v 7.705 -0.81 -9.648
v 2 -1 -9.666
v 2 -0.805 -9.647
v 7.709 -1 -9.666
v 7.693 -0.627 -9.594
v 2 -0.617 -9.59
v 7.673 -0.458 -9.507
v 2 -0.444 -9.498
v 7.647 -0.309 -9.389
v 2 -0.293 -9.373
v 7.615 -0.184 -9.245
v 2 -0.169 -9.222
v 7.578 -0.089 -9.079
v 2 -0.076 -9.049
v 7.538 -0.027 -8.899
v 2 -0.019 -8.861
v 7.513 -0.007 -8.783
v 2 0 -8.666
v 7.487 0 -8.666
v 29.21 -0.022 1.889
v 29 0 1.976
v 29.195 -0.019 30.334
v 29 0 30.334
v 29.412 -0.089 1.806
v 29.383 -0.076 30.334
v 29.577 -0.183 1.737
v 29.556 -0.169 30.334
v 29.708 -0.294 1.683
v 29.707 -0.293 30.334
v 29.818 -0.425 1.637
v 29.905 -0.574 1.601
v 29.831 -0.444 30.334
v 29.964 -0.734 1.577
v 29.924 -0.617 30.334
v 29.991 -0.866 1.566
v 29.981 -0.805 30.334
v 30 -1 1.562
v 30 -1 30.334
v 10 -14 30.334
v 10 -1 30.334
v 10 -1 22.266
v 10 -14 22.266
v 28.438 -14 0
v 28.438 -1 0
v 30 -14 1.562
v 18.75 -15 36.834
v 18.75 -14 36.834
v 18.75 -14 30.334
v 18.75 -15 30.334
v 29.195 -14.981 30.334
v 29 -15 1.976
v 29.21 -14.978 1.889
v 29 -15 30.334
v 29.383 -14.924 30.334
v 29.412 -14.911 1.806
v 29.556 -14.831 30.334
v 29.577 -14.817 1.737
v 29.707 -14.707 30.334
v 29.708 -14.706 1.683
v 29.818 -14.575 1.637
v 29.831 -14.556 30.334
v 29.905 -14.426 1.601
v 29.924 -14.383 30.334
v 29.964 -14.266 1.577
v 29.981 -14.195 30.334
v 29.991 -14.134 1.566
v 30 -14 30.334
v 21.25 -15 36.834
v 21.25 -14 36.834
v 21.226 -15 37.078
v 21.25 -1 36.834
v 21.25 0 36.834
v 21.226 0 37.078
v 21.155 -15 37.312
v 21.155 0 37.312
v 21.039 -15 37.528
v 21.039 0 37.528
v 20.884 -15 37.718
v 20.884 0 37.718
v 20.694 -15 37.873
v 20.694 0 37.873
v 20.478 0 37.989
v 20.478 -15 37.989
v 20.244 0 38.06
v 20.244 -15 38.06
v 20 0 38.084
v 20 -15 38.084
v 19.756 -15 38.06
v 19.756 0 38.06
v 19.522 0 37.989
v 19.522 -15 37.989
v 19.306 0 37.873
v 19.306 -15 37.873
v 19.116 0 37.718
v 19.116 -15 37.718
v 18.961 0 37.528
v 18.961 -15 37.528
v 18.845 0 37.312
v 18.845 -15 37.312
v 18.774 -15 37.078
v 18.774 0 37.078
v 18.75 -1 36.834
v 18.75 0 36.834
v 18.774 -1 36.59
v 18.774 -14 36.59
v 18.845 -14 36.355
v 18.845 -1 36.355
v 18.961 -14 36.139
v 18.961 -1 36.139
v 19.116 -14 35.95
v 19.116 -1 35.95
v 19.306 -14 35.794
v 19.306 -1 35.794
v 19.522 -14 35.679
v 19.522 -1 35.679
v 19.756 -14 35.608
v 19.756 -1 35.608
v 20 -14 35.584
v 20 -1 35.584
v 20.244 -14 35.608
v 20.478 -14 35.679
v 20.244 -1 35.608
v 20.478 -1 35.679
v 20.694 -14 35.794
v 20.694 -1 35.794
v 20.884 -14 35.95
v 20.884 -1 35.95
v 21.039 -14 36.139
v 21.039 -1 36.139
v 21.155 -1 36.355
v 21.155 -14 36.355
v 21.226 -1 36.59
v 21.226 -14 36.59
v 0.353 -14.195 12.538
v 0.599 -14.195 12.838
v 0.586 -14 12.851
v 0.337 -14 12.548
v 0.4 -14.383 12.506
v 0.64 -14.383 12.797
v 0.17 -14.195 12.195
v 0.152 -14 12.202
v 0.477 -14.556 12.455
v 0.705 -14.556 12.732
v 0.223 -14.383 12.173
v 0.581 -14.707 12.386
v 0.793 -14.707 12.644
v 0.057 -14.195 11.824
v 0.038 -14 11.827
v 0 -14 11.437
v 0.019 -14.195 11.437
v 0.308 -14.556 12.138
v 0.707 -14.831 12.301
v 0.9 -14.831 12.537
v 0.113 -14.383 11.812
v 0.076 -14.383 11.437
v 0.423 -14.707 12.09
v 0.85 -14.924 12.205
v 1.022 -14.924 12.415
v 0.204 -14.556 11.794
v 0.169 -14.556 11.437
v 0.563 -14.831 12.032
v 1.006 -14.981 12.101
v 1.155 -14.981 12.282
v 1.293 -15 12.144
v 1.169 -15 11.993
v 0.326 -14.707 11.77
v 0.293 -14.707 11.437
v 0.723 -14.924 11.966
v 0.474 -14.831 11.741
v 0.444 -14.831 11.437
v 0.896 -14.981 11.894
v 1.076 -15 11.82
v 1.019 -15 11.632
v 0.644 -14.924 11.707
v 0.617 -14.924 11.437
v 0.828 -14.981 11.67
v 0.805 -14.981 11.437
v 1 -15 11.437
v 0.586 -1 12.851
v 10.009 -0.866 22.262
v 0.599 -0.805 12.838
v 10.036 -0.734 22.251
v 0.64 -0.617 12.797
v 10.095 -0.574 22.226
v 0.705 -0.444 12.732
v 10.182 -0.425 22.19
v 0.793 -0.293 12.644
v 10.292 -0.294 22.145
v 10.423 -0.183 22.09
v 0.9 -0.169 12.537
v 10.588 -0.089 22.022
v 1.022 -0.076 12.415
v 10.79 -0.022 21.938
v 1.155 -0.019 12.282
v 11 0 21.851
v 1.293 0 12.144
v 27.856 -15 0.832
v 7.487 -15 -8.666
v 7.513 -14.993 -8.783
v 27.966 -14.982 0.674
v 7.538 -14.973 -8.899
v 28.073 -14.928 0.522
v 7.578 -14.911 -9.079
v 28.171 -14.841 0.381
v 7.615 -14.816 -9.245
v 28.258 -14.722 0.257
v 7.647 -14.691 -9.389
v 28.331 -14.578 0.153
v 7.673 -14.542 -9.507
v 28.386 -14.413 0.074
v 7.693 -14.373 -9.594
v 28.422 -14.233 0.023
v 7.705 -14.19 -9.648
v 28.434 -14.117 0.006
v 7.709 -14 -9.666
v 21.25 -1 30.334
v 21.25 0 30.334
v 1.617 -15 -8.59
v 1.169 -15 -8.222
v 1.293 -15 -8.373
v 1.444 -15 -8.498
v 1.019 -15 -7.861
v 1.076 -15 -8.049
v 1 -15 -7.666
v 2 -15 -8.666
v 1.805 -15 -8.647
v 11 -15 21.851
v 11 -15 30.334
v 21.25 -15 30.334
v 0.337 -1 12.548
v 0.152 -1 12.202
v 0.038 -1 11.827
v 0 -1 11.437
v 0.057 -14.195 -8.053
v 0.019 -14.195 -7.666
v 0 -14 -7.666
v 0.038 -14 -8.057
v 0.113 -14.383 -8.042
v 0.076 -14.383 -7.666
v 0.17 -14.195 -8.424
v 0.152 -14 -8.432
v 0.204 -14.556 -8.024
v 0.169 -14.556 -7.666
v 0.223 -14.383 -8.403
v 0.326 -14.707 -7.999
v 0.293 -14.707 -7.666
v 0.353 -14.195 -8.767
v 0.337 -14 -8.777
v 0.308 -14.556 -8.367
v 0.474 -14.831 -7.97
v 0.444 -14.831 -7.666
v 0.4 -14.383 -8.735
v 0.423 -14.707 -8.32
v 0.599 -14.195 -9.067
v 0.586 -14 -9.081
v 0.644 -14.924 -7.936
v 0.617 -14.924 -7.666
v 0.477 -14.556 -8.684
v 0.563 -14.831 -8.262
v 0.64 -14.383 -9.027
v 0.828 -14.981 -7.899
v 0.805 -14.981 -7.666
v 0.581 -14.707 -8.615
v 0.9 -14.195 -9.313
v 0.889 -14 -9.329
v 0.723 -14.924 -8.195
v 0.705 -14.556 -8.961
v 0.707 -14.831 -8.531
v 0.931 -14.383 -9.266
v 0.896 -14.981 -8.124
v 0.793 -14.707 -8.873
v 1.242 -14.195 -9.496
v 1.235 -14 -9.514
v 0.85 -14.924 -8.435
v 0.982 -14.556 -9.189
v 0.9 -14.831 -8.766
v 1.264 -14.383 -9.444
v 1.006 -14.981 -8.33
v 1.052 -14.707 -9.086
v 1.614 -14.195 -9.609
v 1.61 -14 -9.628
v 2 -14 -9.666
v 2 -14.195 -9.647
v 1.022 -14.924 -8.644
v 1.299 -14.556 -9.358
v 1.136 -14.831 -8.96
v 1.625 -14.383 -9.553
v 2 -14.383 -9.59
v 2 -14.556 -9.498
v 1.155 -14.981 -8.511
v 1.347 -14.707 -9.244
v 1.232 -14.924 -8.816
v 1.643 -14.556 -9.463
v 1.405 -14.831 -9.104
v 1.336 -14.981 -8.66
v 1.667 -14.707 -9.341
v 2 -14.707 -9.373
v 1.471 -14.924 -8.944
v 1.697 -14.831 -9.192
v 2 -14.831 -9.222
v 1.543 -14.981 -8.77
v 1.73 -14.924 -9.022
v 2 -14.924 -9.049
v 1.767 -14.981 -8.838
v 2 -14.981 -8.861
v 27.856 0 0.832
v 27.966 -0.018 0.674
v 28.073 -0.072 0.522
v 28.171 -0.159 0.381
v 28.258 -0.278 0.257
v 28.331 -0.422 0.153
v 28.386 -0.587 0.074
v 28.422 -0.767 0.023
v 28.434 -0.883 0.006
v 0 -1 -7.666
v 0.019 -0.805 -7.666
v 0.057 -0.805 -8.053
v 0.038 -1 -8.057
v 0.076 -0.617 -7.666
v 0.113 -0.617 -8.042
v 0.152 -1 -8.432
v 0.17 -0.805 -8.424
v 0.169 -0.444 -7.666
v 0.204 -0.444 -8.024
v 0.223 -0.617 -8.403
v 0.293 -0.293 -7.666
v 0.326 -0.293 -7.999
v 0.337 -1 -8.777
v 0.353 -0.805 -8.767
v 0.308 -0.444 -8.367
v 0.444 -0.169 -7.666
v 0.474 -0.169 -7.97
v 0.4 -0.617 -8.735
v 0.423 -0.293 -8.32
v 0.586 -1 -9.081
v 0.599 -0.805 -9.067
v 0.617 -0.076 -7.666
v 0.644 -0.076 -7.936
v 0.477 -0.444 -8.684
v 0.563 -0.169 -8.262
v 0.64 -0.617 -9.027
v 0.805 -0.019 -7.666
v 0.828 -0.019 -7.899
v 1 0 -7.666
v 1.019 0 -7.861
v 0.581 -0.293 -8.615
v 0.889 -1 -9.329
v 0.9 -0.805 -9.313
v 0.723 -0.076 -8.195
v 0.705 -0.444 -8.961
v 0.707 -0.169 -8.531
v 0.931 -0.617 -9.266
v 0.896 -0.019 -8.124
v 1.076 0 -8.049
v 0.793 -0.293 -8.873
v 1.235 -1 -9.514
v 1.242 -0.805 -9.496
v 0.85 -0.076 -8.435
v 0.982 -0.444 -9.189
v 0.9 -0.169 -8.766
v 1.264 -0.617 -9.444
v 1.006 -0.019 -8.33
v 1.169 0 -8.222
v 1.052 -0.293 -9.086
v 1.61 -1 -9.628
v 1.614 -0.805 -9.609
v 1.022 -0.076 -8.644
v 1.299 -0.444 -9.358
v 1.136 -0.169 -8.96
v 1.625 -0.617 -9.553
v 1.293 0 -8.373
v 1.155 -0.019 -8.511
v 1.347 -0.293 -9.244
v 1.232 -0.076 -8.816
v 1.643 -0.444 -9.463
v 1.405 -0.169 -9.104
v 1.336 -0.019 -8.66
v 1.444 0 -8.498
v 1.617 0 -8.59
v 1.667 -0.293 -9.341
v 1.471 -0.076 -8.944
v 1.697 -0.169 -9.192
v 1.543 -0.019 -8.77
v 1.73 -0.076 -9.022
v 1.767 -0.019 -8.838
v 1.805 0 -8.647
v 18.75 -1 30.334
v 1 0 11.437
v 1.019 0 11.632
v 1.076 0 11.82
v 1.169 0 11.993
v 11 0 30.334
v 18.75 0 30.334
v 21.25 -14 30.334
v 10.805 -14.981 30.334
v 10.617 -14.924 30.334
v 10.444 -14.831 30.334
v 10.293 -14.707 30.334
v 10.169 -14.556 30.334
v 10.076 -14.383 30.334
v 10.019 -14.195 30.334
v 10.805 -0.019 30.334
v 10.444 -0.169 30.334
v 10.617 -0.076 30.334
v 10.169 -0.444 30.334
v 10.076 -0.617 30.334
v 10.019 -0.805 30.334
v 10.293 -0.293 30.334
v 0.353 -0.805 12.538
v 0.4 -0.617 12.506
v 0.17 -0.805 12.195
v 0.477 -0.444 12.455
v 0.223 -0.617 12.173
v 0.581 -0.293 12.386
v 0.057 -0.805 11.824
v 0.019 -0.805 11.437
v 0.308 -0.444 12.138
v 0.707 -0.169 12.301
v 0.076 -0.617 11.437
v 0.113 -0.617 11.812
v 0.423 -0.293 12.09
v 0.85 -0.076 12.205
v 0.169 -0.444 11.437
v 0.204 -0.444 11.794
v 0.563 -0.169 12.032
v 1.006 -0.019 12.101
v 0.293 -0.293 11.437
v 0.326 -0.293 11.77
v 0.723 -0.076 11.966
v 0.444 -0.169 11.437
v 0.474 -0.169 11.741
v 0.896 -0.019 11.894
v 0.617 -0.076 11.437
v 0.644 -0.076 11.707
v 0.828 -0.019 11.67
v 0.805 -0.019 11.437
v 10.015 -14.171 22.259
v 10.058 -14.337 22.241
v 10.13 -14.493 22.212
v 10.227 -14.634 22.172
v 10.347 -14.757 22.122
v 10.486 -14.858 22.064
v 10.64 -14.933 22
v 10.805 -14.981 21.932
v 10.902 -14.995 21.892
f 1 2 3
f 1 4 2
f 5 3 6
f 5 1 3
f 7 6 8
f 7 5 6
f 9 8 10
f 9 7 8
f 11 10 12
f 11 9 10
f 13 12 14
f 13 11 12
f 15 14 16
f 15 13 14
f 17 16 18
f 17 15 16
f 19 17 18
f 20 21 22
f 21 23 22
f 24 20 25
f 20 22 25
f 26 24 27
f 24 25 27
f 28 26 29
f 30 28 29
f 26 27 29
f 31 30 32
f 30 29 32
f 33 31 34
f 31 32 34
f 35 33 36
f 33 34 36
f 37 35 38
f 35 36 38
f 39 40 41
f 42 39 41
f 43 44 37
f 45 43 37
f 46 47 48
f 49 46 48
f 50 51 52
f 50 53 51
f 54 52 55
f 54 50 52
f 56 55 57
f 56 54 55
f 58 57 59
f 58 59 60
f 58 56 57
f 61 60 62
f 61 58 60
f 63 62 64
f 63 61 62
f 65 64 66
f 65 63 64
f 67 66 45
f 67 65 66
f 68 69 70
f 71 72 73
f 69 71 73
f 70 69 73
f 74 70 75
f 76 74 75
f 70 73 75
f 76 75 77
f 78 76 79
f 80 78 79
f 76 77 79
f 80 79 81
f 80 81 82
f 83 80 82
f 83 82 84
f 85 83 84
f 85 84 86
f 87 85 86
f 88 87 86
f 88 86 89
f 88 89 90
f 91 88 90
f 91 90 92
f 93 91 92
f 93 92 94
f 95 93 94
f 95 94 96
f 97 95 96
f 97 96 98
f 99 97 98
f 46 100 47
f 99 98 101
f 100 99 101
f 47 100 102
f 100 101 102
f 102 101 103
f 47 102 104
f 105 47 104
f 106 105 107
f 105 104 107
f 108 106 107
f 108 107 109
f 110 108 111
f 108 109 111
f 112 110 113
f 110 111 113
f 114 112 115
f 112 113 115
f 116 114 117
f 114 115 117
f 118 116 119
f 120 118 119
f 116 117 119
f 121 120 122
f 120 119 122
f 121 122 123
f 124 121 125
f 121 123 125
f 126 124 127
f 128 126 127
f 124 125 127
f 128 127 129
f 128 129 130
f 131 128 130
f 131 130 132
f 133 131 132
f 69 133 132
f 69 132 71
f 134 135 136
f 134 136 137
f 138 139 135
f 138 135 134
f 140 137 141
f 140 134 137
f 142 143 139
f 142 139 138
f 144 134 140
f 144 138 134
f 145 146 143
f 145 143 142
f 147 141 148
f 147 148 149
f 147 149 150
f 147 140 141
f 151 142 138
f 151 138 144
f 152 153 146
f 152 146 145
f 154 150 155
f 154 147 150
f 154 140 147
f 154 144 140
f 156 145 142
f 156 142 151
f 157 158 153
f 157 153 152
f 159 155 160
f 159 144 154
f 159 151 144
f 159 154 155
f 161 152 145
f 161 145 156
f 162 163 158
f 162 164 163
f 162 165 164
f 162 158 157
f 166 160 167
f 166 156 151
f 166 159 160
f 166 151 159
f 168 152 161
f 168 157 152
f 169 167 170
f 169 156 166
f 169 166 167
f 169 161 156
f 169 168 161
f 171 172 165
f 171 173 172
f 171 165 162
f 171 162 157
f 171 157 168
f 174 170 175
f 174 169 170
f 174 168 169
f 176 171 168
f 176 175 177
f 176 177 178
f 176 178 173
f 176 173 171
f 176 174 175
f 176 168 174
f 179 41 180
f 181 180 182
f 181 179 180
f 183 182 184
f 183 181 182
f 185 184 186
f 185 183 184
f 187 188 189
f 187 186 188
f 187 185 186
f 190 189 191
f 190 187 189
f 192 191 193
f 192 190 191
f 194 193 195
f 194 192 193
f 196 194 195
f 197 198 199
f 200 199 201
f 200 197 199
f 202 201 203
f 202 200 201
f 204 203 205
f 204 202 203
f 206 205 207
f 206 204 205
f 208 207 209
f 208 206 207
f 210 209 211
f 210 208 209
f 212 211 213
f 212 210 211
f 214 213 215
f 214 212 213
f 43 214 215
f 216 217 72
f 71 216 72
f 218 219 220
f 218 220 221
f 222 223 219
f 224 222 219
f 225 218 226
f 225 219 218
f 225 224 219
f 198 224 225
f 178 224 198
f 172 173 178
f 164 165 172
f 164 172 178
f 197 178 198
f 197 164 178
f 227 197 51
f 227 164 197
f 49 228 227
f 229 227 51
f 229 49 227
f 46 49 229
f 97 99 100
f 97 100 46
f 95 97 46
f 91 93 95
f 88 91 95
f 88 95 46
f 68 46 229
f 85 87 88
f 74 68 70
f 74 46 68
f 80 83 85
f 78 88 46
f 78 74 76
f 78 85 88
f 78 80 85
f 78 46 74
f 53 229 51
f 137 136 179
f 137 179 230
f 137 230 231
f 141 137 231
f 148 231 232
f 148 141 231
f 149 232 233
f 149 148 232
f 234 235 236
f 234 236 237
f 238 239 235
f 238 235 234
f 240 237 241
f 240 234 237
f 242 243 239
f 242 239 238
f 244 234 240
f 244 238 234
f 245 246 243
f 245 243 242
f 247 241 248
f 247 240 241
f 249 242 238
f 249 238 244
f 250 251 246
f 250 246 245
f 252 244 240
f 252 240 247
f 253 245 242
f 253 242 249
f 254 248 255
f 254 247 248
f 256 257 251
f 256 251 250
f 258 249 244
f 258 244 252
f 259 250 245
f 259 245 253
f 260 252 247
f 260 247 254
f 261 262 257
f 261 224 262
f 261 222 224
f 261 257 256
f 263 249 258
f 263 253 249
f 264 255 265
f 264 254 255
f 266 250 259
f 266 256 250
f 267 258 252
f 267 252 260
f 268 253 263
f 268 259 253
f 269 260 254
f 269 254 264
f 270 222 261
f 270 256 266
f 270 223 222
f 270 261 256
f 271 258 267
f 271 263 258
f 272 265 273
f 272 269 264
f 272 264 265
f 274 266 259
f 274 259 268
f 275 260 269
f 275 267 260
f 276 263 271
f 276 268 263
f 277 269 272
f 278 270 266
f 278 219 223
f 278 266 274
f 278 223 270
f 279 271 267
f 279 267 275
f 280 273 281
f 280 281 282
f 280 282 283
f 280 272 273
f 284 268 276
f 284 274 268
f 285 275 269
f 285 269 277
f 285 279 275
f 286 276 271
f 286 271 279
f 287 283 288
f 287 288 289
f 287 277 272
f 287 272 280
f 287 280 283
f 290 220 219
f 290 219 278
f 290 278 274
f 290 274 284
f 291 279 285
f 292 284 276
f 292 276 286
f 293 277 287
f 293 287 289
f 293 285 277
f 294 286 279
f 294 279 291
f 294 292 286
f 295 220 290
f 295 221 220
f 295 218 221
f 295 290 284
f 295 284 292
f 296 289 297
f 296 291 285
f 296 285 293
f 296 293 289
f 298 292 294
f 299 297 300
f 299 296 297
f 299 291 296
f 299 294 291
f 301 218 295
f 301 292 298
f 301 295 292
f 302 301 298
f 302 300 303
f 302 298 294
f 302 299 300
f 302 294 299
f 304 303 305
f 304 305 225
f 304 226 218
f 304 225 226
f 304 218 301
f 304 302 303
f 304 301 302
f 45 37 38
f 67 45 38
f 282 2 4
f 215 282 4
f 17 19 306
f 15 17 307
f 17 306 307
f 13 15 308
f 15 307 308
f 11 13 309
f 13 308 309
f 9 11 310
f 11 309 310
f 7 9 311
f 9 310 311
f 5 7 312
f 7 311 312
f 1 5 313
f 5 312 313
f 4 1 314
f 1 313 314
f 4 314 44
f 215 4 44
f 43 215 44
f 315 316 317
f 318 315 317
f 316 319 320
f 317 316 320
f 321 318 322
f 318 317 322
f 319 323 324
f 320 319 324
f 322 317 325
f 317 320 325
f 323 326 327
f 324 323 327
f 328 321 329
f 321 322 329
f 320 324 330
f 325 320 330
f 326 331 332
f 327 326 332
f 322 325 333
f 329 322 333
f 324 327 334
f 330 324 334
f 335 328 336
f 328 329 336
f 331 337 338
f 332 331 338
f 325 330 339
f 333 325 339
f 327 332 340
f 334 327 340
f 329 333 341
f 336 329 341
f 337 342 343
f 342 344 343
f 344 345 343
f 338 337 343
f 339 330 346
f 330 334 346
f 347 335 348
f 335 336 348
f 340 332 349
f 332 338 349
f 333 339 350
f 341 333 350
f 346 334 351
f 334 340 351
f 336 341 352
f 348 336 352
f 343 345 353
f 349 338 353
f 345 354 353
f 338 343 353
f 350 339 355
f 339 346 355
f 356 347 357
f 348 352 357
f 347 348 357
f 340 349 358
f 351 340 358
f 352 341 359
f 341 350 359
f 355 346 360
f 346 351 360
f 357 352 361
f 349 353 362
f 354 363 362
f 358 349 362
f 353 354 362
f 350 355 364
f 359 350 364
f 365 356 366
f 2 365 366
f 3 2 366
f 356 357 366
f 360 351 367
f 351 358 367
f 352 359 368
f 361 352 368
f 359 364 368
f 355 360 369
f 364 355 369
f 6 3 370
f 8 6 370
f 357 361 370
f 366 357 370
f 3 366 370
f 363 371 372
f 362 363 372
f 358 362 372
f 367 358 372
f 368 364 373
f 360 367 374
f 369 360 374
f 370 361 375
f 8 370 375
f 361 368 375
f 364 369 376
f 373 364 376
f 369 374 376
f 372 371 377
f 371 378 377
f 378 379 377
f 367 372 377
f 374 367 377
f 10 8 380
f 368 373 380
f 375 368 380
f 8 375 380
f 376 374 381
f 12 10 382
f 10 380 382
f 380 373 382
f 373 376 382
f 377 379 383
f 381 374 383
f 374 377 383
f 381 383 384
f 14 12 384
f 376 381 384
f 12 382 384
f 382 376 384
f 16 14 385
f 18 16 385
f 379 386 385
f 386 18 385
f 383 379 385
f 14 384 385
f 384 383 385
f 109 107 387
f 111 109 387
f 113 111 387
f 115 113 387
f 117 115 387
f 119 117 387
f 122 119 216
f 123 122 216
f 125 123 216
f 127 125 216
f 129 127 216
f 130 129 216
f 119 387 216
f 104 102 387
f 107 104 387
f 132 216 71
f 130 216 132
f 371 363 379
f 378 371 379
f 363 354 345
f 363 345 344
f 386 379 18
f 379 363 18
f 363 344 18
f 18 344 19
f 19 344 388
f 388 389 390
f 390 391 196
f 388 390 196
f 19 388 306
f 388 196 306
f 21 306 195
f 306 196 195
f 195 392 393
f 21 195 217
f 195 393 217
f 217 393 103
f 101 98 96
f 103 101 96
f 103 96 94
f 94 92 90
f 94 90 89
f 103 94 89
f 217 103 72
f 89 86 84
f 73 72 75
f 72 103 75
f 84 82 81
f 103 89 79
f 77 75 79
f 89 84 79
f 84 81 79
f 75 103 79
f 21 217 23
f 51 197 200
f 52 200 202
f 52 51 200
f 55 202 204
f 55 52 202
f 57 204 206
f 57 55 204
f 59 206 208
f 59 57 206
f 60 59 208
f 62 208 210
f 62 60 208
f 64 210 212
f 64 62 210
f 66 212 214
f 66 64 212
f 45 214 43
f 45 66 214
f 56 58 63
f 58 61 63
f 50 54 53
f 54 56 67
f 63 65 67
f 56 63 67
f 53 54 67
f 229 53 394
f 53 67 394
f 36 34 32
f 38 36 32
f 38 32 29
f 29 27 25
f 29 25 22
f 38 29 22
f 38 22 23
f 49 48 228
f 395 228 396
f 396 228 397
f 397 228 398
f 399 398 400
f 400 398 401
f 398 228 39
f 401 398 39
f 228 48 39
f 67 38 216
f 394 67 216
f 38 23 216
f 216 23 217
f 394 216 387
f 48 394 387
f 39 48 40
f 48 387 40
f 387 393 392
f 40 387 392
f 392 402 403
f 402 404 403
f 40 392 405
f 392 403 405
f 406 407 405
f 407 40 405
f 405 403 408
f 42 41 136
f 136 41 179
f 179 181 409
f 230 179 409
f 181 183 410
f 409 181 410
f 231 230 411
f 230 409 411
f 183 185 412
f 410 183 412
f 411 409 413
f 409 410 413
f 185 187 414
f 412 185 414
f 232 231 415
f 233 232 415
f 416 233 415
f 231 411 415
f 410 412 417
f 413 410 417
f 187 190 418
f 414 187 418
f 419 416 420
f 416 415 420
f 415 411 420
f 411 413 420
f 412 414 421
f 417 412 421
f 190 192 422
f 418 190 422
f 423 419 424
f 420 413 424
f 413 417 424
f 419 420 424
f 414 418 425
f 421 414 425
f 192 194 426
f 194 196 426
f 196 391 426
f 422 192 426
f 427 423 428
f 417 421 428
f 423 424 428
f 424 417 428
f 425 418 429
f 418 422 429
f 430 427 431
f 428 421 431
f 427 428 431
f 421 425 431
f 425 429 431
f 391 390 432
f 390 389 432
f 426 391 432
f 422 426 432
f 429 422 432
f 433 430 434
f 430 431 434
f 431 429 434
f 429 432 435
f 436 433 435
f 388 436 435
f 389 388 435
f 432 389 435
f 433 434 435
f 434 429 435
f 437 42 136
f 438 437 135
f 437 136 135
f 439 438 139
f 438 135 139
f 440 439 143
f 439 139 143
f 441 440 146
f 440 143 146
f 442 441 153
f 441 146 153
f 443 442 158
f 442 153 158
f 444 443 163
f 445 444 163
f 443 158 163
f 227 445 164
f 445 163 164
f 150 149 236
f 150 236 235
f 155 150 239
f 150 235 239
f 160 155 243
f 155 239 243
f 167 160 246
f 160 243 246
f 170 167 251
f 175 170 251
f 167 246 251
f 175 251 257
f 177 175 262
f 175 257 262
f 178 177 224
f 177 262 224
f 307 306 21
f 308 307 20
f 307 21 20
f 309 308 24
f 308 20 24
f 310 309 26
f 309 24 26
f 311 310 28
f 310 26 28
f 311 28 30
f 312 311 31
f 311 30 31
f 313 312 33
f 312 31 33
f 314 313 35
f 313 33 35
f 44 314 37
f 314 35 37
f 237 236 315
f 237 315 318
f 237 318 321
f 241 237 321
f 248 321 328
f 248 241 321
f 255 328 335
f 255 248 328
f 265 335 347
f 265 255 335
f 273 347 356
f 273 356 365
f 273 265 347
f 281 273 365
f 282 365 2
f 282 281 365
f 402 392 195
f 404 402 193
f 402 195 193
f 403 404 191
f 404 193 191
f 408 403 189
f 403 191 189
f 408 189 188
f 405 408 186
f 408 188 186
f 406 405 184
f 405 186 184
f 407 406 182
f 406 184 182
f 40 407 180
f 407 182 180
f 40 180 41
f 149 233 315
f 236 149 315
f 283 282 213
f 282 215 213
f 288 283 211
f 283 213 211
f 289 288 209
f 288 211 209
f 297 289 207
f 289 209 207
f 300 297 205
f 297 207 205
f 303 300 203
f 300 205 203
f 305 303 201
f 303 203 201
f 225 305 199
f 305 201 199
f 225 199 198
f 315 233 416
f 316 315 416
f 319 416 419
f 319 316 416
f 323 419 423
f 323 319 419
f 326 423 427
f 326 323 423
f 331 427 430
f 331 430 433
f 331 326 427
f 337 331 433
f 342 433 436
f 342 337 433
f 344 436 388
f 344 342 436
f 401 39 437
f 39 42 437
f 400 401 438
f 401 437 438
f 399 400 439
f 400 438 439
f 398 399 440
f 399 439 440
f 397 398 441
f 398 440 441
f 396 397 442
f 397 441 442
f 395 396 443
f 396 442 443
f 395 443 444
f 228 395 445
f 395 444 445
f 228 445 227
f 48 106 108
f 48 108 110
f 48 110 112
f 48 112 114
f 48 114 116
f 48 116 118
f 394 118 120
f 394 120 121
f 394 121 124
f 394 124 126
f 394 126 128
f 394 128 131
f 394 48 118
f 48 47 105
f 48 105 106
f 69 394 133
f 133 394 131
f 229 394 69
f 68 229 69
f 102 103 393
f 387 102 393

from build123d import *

# Parameters (mm, degrees)
F2_DEPTH  = 15
F3_R      = 2
F4_R      = 1
F7_DEPTH  = 15
F8_W      = 3.7031254775
F8_H      = 13
F9_DEPTH  = 25
F10_R     = 1.25
F11_DEPTH = 13


with BuildPart() as f2:
    # F1 (on Front) → F2 (new body)
    with BuildSketch(Plane.XZ):
        Polygon((10, 22.2655313462), (0, 12.2655313462), (0, -9.6663414017), (7.7085571088, -9.6663414017), (28.4380931407, 0), (30, 1.5619068593), (30, 30.3336585983), (10, 30.3336585983), align=None)
    extrude(amount=F2_DEPTH)

    # F3
    f3_edges = [f2.edges().sort_by_distance(p)[0] for p in [
        (0, -7.5, 12.265531),
        (0, -7.5, -9.666341),
    ]]
    fillet(f3_edges, radius=F3_R)

    # F4
    f4_edges = [f2.edges().sort_by_distance(p)[0] for p in [
        (5.292893, -15, 17.558425),
        (10, -15, 26.299595),
        (10, 0, 26.299595),
        (5.292893, 0, 17.558425),
        (18.073325, -15, -4.833171),
        (30, -15, 15.947783),
        (29.219047, -15, 0.780953),
        (29.219047, 0, 0.780953),
        (30, 0, 15.947783),
        (18.073325, 0, -4.833171),
        (0.152241, 0, 12.202471),
        (0, 0, 1.885381),
        (0.585786, 0, -9.080555),
        (4.854279, 0, -9.666341),
        (0.152241, -15, 12.202471),
        (0, -15, 1.885381),
        (0.585786, -15, -9.080555),
        (4.854279, -15, -9.666341),
    ]]
    fillet(f4_edges, radius=F4_R)

    # F6 (on Front) → F7 (join)
    with BuildSketch(Plane.XZ):
        with BuildLine():
            Line((18.75, 30.3336585983), (21.25, 30.3336585983))
            Line((21.25, 30.3336585983), (21.25, 36.8336585983))
            ThreePointArc((21.25, 36.8336585983), (20, 38.0836585983), (18.75, 36.8336585983))
            Line((18.75, 36.8336585983), (18.75, 30.3336585983))
        make_face()
    extrude(amount=F7_DEPTH)

    # F8 (on face) → F9 (cut)
    with BuildSketch(Plane.XY.offset(30.3336585983)):
        with Locations((20.149352029, -7.5)):
            Rectangle(F8_W, F8_H)
    extrude(amount=F9_DEPTH, mode=Mode.SUBTRACT)

    # F10 (on face) → F11 (join)
    with BuildSketch(Plane.XZ.offset(1)):
        with Locations((20, 36.8336585983)):
            Circle(F10_R)
    extrude(amount=F11_DEPTH)


solid = f2.part
